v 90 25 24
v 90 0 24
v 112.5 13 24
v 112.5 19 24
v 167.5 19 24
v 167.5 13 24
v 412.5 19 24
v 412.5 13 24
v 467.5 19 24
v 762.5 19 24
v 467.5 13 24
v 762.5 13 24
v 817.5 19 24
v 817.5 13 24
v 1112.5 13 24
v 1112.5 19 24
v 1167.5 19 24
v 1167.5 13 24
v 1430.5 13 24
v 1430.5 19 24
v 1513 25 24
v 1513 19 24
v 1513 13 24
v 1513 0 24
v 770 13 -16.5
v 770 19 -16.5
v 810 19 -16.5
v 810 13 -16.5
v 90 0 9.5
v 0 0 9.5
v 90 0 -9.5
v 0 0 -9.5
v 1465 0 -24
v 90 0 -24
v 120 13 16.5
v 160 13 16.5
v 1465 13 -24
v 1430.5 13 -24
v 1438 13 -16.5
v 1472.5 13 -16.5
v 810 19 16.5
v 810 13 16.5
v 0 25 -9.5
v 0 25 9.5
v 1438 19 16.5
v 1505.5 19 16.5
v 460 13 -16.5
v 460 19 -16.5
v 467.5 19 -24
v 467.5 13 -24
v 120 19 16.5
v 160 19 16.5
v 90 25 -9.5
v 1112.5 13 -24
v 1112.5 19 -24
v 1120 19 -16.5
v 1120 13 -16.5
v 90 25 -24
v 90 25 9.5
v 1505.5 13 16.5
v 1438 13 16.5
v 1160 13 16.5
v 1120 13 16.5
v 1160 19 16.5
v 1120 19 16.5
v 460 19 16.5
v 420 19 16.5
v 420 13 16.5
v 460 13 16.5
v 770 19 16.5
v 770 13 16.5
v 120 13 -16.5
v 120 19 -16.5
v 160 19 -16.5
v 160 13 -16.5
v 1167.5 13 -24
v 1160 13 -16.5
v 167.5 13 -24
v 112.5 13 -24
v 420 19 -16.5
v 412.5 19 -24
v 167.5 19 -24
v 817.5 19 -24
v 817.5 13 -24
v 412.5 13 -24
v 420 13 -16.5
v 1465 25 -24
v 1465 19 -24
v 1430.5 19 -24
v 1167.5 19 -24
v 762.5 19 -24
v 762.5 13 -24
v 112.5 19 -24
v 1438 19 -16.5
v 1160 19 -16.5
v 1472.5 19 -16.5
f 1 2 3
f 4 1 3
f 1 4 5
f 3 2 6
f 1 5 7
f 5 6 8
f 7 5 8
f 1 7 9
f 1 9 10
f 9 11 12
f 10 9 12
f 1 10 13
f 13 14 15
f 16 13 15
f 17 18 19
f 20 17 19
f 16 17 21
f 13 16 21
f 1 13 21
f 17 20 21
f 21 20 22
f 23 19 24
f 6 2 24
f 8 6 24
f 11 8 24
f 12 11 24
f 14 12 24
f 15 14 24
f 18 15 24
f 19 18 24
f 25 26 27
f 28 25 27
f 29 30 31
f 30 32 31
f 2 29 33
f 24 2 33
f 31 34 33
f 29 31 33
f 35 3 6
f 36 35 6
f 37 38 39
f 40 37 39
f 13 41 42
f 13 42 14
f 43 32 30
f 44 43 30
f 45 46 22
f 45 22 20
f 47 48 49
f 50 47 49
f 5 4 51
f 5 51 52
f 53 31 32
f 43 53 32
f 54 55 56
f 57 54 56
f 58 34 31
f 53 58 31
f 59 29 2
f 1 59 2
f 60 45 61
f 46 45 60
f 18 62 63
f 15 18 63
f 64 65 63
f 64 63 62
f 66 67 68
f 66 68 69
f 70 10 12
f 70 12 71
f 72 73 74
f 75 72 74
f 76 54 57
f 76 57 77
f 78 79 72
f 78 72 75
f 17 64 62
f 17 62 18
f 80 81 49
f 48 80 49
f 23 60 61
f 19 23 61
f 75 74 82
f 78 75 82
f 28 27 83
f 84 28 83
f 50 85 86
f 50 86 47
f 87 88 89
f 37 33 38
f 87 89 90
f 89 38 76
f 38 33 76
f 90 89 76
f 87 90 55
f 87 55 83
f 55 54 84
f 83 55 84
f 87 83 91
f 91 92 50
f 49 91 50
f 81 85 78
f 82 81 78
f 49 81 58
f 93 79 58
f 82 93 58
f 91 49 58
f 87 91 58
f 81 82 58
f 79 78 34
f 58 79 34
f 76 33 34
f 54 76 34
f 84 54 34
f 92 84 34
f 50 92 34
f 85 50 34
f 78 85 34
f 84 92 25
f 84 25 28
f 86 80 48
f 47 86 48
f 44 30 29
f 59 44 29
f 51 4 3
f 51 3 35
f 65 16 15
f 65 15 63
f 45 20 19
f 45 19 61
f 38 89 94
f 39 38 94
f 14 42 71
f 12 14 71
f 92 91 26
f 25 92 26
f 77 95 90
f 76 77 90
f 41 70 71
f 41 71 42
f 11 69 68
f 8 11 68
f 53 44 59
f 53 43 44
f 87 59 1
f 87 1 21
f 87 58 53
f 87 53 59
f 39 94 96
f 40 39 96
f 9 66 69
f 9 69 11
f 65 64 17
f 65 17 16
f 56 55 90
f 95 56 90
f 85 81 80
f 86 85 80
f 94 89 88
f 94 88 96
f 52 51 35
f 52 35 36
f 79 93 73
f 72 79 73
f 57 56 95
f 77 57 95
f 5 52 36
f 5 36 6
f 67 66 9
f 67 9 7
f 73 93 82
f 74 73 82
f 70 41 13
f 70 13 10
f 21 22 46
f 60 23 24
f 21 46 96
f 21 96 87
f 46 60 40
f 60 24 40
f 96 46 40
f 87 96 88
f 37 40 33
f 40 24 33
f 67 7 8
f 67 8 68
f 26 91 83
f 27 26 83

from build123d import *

# Parameters (mm, degrees)
EXTRUDE_1_DEPTH               = 25
CUT_EXTRUDE_START             = -6
CUT_EXTRUDE_1_DEPTH           = 6
PATTERN_LINEAR_1_COUNT        = 2
PATTERN_LINEAR_1_PITCH        = 300
PATTERN_START                 = -6
PATTERN_LINEAR_3_COPY_1_DEPTH = 6
PATTERN_LINEAR_3_COPY_2_DEPTH = 6
MIRROR_START                  = -6
MIRROR_5_COPY_1_DEPTH         = 6
MIRROR_5_COPY_2_DEPTH         = 6
MIRROR_5_COPY_3_DEPTH         = 6
MIRROR_5_COPY_4_DEPTH         = 6
MIRROR_5_COPY_5_DEPTH         = 6
CUT_EXTRUDE_3_DEPTH           = 6
CUT_EXTRUDE_4_DEPTH           = 6


with BuildPart() as part:
    # 草图1 → 凸台-拉伸1 (new body)
    with BuildSketch(Plane(origin=(0, 0, 0), x_dir=(1, 0, 0), z_dir=(0, 1, 0))):
        Polygon((0, 0), (0, -9.5), (90, -9.5), (90, -24), (1513, -24), (1465, 24), (90, 24), (90, 9.5), (0, 9.5), align=None)
    extrude(amount=EXTRUDE_1_DEPTH)

    # 草图2 → 切除-拉伸1 (cut)
    with BuildSketch(Plane(origin=(0, 25, 0), x_dir=(1, 0, 0), z_dir=(0, 1, 0)).offset(CUT_EXTRUDE_START)):
        Polygon((112.5, 24), (120, 16.5), (160, 16.5), (167.5, 24), align=None)
    cut_extrude_1 = extrude(amount=-CUT_EXTRUDE_1_DEPTH, mode=Mode.SUBTRACT)

    # 阵列(线性)1: 切除-拉伸1 ×2
    with Locations(*[(i * PATTERN_LINEAR_1_PITCH, 0, 0) for i in range(1, PATTERN_LINEAR_1_COUNT)]):
        add(cut_extrude_1, mode=Mode.SUBTRACT)

    # 阵列(线性)3 copy 1 sketch → 阵列(线性)3 copy 1 (cut)
    with BuildSketch(Plane(origin=(650, 25, 0), x_dir=(1, 0, 0), z_dir=(0, 1, 0)).offset(PATTERN_START)):
        Polygon((112.5, 24), (120, 16.5), (160, 16.5), (167.5, 24), align=None)
    extrude(amount=-PATTERN_LINEAR_3_COPY_1_DEPTH, mode=Mode.SUBTRACT)

    # 阵列(线性)3 copy 2 sketch → 阵列(线性)3 copy 2 (cut)
    with BuildSketch(Plane(origin=(1000, 25, 0), x_dir=(1, 0, 0), z_dir=(0, 1, 0)).offset(PATTERN_START)):
        Polygon((112.5, 24), (120, 16.5), (160, 16.5), (167.5, 24), align=None)
    extrude(amount=-PATTERN_LINEAR_3_COPY_2_DEPTH, mode=Mode.SUBTRACT)

    # 镜向3: 切除-拉伸1 across plane
    add(cut_extrude_1.mirror(Plane.XY), mode=Mode.SUBTRACT)

    # 镜向5 copy 1 sketch → 镜向5 copy 1 (cut)
    with BuildSketch(Plane(origin=(300, 25, 0), x_dir=(1, 0, 0), z_dir=(0, 1, 0)).offset(MIRROR_START)):
        Polygon((112.5, -24), (120, -16.5), (160, -16.5), (167.5, -24), align=None)
    extrude(amount=-MIRROR_5_COPY_1_DEPTH, mode=Mode.SUBTRACT)

    # 镜向5 copy 2 sketch → 镜向5 copy 2 (cut)
    with BuildSketch(Plane(origin=(0, 25, 0), x_dir=(1, 0, 0), z_dir=(0, 1, 0)).offset(MIRROR_START)):
        Polygon((112.5, -24), (120, -16.5), (160, -16.5), (167.5, -24), align=None)
    extrude(amount=-MIRROR_5_COPY_2_DEPTH, mode=Mode.SUBTRACT)

    # 镜向5 copy 3 sketch → 镜向5 copy 3 (cut)
    with BuildSketch(Plane(origin=(650, 25, 0), x_dir=(1, 0, 0), z_dir=(0, 1, 0)).offset(MIRROR_START)):
        Polygon((112.5, -24), (120, -16.5), (160, -16.5), (167.5, -24), align=None)
    extrude(amount=-MIRROR_5_COPY_3_DEPTH, mode=Mode.SUBTRACT)

    # 镜向5 copy 4 sketch → 镜向5 copy 4 (cut)
    with BuildSketch(Plane(origin=(1000, 25, 0), x_dir=(1, 0, 0), z_dir=(0, 1, 0)).offset(MIRROR_START)):
        Polygon((112.5, -24), (120, -16.5), (160, -16.5), (167.5, -24), align=None)
    extrude(amount=-MIRROR_5_COPY_4_DEPTH, mode=Mode.SUBTRACT)

    # 镜向5 copy 5 sketch → 镜向5 copy 5 (cut)
    with BuildSketch(Plane(origin=(0, 25, 0), x_dir=(1, 0, 0), z_dir=(0, 1, 0)).offset(MIRROR_START)):
        Polygon((112.5, -24), (120, -16.5), (160, -16.5), (167.5, -24), align=None)
    extrude(amount=-MIRROR_5_COPY_5_DEPTH, mode=Mode.SUBTRACT)

    # 草图3 → 切除-拉伸3 (cut)
    with BuildSketch(Plane(origin=(0, 25, 0), x_dir=(1, 0, 0), z_dir=(0, 1, 0)).offset(CUT_EXTRUDE_START)):
        Polygon((1430.5, 24), (1438, 16.5), (1472.5, 16.5), (1465, 24), align=None)
    extrude(amount=-CUT_EXTRUDE_3_DEPTH, mode=Mode.SUBTRACT)

    # 草图4 → 切除-拉伸4 (cut)
    with BuildSketch(Plane(origin=(0, 25, 0), x_dir=(1, 0, 0), z_dir=(0, 1, 0)).offset(CUT_EXTRUDE_START)):
        Polygon((1430.5, -24), (1438, -16.5), (1505.5, -16.5), (1513, -24), align=None)
    extrude(amount=-CUT_EXTRUDE_4_DEPTH, mode=Mode.SUBTRACT)


solid = part.part
